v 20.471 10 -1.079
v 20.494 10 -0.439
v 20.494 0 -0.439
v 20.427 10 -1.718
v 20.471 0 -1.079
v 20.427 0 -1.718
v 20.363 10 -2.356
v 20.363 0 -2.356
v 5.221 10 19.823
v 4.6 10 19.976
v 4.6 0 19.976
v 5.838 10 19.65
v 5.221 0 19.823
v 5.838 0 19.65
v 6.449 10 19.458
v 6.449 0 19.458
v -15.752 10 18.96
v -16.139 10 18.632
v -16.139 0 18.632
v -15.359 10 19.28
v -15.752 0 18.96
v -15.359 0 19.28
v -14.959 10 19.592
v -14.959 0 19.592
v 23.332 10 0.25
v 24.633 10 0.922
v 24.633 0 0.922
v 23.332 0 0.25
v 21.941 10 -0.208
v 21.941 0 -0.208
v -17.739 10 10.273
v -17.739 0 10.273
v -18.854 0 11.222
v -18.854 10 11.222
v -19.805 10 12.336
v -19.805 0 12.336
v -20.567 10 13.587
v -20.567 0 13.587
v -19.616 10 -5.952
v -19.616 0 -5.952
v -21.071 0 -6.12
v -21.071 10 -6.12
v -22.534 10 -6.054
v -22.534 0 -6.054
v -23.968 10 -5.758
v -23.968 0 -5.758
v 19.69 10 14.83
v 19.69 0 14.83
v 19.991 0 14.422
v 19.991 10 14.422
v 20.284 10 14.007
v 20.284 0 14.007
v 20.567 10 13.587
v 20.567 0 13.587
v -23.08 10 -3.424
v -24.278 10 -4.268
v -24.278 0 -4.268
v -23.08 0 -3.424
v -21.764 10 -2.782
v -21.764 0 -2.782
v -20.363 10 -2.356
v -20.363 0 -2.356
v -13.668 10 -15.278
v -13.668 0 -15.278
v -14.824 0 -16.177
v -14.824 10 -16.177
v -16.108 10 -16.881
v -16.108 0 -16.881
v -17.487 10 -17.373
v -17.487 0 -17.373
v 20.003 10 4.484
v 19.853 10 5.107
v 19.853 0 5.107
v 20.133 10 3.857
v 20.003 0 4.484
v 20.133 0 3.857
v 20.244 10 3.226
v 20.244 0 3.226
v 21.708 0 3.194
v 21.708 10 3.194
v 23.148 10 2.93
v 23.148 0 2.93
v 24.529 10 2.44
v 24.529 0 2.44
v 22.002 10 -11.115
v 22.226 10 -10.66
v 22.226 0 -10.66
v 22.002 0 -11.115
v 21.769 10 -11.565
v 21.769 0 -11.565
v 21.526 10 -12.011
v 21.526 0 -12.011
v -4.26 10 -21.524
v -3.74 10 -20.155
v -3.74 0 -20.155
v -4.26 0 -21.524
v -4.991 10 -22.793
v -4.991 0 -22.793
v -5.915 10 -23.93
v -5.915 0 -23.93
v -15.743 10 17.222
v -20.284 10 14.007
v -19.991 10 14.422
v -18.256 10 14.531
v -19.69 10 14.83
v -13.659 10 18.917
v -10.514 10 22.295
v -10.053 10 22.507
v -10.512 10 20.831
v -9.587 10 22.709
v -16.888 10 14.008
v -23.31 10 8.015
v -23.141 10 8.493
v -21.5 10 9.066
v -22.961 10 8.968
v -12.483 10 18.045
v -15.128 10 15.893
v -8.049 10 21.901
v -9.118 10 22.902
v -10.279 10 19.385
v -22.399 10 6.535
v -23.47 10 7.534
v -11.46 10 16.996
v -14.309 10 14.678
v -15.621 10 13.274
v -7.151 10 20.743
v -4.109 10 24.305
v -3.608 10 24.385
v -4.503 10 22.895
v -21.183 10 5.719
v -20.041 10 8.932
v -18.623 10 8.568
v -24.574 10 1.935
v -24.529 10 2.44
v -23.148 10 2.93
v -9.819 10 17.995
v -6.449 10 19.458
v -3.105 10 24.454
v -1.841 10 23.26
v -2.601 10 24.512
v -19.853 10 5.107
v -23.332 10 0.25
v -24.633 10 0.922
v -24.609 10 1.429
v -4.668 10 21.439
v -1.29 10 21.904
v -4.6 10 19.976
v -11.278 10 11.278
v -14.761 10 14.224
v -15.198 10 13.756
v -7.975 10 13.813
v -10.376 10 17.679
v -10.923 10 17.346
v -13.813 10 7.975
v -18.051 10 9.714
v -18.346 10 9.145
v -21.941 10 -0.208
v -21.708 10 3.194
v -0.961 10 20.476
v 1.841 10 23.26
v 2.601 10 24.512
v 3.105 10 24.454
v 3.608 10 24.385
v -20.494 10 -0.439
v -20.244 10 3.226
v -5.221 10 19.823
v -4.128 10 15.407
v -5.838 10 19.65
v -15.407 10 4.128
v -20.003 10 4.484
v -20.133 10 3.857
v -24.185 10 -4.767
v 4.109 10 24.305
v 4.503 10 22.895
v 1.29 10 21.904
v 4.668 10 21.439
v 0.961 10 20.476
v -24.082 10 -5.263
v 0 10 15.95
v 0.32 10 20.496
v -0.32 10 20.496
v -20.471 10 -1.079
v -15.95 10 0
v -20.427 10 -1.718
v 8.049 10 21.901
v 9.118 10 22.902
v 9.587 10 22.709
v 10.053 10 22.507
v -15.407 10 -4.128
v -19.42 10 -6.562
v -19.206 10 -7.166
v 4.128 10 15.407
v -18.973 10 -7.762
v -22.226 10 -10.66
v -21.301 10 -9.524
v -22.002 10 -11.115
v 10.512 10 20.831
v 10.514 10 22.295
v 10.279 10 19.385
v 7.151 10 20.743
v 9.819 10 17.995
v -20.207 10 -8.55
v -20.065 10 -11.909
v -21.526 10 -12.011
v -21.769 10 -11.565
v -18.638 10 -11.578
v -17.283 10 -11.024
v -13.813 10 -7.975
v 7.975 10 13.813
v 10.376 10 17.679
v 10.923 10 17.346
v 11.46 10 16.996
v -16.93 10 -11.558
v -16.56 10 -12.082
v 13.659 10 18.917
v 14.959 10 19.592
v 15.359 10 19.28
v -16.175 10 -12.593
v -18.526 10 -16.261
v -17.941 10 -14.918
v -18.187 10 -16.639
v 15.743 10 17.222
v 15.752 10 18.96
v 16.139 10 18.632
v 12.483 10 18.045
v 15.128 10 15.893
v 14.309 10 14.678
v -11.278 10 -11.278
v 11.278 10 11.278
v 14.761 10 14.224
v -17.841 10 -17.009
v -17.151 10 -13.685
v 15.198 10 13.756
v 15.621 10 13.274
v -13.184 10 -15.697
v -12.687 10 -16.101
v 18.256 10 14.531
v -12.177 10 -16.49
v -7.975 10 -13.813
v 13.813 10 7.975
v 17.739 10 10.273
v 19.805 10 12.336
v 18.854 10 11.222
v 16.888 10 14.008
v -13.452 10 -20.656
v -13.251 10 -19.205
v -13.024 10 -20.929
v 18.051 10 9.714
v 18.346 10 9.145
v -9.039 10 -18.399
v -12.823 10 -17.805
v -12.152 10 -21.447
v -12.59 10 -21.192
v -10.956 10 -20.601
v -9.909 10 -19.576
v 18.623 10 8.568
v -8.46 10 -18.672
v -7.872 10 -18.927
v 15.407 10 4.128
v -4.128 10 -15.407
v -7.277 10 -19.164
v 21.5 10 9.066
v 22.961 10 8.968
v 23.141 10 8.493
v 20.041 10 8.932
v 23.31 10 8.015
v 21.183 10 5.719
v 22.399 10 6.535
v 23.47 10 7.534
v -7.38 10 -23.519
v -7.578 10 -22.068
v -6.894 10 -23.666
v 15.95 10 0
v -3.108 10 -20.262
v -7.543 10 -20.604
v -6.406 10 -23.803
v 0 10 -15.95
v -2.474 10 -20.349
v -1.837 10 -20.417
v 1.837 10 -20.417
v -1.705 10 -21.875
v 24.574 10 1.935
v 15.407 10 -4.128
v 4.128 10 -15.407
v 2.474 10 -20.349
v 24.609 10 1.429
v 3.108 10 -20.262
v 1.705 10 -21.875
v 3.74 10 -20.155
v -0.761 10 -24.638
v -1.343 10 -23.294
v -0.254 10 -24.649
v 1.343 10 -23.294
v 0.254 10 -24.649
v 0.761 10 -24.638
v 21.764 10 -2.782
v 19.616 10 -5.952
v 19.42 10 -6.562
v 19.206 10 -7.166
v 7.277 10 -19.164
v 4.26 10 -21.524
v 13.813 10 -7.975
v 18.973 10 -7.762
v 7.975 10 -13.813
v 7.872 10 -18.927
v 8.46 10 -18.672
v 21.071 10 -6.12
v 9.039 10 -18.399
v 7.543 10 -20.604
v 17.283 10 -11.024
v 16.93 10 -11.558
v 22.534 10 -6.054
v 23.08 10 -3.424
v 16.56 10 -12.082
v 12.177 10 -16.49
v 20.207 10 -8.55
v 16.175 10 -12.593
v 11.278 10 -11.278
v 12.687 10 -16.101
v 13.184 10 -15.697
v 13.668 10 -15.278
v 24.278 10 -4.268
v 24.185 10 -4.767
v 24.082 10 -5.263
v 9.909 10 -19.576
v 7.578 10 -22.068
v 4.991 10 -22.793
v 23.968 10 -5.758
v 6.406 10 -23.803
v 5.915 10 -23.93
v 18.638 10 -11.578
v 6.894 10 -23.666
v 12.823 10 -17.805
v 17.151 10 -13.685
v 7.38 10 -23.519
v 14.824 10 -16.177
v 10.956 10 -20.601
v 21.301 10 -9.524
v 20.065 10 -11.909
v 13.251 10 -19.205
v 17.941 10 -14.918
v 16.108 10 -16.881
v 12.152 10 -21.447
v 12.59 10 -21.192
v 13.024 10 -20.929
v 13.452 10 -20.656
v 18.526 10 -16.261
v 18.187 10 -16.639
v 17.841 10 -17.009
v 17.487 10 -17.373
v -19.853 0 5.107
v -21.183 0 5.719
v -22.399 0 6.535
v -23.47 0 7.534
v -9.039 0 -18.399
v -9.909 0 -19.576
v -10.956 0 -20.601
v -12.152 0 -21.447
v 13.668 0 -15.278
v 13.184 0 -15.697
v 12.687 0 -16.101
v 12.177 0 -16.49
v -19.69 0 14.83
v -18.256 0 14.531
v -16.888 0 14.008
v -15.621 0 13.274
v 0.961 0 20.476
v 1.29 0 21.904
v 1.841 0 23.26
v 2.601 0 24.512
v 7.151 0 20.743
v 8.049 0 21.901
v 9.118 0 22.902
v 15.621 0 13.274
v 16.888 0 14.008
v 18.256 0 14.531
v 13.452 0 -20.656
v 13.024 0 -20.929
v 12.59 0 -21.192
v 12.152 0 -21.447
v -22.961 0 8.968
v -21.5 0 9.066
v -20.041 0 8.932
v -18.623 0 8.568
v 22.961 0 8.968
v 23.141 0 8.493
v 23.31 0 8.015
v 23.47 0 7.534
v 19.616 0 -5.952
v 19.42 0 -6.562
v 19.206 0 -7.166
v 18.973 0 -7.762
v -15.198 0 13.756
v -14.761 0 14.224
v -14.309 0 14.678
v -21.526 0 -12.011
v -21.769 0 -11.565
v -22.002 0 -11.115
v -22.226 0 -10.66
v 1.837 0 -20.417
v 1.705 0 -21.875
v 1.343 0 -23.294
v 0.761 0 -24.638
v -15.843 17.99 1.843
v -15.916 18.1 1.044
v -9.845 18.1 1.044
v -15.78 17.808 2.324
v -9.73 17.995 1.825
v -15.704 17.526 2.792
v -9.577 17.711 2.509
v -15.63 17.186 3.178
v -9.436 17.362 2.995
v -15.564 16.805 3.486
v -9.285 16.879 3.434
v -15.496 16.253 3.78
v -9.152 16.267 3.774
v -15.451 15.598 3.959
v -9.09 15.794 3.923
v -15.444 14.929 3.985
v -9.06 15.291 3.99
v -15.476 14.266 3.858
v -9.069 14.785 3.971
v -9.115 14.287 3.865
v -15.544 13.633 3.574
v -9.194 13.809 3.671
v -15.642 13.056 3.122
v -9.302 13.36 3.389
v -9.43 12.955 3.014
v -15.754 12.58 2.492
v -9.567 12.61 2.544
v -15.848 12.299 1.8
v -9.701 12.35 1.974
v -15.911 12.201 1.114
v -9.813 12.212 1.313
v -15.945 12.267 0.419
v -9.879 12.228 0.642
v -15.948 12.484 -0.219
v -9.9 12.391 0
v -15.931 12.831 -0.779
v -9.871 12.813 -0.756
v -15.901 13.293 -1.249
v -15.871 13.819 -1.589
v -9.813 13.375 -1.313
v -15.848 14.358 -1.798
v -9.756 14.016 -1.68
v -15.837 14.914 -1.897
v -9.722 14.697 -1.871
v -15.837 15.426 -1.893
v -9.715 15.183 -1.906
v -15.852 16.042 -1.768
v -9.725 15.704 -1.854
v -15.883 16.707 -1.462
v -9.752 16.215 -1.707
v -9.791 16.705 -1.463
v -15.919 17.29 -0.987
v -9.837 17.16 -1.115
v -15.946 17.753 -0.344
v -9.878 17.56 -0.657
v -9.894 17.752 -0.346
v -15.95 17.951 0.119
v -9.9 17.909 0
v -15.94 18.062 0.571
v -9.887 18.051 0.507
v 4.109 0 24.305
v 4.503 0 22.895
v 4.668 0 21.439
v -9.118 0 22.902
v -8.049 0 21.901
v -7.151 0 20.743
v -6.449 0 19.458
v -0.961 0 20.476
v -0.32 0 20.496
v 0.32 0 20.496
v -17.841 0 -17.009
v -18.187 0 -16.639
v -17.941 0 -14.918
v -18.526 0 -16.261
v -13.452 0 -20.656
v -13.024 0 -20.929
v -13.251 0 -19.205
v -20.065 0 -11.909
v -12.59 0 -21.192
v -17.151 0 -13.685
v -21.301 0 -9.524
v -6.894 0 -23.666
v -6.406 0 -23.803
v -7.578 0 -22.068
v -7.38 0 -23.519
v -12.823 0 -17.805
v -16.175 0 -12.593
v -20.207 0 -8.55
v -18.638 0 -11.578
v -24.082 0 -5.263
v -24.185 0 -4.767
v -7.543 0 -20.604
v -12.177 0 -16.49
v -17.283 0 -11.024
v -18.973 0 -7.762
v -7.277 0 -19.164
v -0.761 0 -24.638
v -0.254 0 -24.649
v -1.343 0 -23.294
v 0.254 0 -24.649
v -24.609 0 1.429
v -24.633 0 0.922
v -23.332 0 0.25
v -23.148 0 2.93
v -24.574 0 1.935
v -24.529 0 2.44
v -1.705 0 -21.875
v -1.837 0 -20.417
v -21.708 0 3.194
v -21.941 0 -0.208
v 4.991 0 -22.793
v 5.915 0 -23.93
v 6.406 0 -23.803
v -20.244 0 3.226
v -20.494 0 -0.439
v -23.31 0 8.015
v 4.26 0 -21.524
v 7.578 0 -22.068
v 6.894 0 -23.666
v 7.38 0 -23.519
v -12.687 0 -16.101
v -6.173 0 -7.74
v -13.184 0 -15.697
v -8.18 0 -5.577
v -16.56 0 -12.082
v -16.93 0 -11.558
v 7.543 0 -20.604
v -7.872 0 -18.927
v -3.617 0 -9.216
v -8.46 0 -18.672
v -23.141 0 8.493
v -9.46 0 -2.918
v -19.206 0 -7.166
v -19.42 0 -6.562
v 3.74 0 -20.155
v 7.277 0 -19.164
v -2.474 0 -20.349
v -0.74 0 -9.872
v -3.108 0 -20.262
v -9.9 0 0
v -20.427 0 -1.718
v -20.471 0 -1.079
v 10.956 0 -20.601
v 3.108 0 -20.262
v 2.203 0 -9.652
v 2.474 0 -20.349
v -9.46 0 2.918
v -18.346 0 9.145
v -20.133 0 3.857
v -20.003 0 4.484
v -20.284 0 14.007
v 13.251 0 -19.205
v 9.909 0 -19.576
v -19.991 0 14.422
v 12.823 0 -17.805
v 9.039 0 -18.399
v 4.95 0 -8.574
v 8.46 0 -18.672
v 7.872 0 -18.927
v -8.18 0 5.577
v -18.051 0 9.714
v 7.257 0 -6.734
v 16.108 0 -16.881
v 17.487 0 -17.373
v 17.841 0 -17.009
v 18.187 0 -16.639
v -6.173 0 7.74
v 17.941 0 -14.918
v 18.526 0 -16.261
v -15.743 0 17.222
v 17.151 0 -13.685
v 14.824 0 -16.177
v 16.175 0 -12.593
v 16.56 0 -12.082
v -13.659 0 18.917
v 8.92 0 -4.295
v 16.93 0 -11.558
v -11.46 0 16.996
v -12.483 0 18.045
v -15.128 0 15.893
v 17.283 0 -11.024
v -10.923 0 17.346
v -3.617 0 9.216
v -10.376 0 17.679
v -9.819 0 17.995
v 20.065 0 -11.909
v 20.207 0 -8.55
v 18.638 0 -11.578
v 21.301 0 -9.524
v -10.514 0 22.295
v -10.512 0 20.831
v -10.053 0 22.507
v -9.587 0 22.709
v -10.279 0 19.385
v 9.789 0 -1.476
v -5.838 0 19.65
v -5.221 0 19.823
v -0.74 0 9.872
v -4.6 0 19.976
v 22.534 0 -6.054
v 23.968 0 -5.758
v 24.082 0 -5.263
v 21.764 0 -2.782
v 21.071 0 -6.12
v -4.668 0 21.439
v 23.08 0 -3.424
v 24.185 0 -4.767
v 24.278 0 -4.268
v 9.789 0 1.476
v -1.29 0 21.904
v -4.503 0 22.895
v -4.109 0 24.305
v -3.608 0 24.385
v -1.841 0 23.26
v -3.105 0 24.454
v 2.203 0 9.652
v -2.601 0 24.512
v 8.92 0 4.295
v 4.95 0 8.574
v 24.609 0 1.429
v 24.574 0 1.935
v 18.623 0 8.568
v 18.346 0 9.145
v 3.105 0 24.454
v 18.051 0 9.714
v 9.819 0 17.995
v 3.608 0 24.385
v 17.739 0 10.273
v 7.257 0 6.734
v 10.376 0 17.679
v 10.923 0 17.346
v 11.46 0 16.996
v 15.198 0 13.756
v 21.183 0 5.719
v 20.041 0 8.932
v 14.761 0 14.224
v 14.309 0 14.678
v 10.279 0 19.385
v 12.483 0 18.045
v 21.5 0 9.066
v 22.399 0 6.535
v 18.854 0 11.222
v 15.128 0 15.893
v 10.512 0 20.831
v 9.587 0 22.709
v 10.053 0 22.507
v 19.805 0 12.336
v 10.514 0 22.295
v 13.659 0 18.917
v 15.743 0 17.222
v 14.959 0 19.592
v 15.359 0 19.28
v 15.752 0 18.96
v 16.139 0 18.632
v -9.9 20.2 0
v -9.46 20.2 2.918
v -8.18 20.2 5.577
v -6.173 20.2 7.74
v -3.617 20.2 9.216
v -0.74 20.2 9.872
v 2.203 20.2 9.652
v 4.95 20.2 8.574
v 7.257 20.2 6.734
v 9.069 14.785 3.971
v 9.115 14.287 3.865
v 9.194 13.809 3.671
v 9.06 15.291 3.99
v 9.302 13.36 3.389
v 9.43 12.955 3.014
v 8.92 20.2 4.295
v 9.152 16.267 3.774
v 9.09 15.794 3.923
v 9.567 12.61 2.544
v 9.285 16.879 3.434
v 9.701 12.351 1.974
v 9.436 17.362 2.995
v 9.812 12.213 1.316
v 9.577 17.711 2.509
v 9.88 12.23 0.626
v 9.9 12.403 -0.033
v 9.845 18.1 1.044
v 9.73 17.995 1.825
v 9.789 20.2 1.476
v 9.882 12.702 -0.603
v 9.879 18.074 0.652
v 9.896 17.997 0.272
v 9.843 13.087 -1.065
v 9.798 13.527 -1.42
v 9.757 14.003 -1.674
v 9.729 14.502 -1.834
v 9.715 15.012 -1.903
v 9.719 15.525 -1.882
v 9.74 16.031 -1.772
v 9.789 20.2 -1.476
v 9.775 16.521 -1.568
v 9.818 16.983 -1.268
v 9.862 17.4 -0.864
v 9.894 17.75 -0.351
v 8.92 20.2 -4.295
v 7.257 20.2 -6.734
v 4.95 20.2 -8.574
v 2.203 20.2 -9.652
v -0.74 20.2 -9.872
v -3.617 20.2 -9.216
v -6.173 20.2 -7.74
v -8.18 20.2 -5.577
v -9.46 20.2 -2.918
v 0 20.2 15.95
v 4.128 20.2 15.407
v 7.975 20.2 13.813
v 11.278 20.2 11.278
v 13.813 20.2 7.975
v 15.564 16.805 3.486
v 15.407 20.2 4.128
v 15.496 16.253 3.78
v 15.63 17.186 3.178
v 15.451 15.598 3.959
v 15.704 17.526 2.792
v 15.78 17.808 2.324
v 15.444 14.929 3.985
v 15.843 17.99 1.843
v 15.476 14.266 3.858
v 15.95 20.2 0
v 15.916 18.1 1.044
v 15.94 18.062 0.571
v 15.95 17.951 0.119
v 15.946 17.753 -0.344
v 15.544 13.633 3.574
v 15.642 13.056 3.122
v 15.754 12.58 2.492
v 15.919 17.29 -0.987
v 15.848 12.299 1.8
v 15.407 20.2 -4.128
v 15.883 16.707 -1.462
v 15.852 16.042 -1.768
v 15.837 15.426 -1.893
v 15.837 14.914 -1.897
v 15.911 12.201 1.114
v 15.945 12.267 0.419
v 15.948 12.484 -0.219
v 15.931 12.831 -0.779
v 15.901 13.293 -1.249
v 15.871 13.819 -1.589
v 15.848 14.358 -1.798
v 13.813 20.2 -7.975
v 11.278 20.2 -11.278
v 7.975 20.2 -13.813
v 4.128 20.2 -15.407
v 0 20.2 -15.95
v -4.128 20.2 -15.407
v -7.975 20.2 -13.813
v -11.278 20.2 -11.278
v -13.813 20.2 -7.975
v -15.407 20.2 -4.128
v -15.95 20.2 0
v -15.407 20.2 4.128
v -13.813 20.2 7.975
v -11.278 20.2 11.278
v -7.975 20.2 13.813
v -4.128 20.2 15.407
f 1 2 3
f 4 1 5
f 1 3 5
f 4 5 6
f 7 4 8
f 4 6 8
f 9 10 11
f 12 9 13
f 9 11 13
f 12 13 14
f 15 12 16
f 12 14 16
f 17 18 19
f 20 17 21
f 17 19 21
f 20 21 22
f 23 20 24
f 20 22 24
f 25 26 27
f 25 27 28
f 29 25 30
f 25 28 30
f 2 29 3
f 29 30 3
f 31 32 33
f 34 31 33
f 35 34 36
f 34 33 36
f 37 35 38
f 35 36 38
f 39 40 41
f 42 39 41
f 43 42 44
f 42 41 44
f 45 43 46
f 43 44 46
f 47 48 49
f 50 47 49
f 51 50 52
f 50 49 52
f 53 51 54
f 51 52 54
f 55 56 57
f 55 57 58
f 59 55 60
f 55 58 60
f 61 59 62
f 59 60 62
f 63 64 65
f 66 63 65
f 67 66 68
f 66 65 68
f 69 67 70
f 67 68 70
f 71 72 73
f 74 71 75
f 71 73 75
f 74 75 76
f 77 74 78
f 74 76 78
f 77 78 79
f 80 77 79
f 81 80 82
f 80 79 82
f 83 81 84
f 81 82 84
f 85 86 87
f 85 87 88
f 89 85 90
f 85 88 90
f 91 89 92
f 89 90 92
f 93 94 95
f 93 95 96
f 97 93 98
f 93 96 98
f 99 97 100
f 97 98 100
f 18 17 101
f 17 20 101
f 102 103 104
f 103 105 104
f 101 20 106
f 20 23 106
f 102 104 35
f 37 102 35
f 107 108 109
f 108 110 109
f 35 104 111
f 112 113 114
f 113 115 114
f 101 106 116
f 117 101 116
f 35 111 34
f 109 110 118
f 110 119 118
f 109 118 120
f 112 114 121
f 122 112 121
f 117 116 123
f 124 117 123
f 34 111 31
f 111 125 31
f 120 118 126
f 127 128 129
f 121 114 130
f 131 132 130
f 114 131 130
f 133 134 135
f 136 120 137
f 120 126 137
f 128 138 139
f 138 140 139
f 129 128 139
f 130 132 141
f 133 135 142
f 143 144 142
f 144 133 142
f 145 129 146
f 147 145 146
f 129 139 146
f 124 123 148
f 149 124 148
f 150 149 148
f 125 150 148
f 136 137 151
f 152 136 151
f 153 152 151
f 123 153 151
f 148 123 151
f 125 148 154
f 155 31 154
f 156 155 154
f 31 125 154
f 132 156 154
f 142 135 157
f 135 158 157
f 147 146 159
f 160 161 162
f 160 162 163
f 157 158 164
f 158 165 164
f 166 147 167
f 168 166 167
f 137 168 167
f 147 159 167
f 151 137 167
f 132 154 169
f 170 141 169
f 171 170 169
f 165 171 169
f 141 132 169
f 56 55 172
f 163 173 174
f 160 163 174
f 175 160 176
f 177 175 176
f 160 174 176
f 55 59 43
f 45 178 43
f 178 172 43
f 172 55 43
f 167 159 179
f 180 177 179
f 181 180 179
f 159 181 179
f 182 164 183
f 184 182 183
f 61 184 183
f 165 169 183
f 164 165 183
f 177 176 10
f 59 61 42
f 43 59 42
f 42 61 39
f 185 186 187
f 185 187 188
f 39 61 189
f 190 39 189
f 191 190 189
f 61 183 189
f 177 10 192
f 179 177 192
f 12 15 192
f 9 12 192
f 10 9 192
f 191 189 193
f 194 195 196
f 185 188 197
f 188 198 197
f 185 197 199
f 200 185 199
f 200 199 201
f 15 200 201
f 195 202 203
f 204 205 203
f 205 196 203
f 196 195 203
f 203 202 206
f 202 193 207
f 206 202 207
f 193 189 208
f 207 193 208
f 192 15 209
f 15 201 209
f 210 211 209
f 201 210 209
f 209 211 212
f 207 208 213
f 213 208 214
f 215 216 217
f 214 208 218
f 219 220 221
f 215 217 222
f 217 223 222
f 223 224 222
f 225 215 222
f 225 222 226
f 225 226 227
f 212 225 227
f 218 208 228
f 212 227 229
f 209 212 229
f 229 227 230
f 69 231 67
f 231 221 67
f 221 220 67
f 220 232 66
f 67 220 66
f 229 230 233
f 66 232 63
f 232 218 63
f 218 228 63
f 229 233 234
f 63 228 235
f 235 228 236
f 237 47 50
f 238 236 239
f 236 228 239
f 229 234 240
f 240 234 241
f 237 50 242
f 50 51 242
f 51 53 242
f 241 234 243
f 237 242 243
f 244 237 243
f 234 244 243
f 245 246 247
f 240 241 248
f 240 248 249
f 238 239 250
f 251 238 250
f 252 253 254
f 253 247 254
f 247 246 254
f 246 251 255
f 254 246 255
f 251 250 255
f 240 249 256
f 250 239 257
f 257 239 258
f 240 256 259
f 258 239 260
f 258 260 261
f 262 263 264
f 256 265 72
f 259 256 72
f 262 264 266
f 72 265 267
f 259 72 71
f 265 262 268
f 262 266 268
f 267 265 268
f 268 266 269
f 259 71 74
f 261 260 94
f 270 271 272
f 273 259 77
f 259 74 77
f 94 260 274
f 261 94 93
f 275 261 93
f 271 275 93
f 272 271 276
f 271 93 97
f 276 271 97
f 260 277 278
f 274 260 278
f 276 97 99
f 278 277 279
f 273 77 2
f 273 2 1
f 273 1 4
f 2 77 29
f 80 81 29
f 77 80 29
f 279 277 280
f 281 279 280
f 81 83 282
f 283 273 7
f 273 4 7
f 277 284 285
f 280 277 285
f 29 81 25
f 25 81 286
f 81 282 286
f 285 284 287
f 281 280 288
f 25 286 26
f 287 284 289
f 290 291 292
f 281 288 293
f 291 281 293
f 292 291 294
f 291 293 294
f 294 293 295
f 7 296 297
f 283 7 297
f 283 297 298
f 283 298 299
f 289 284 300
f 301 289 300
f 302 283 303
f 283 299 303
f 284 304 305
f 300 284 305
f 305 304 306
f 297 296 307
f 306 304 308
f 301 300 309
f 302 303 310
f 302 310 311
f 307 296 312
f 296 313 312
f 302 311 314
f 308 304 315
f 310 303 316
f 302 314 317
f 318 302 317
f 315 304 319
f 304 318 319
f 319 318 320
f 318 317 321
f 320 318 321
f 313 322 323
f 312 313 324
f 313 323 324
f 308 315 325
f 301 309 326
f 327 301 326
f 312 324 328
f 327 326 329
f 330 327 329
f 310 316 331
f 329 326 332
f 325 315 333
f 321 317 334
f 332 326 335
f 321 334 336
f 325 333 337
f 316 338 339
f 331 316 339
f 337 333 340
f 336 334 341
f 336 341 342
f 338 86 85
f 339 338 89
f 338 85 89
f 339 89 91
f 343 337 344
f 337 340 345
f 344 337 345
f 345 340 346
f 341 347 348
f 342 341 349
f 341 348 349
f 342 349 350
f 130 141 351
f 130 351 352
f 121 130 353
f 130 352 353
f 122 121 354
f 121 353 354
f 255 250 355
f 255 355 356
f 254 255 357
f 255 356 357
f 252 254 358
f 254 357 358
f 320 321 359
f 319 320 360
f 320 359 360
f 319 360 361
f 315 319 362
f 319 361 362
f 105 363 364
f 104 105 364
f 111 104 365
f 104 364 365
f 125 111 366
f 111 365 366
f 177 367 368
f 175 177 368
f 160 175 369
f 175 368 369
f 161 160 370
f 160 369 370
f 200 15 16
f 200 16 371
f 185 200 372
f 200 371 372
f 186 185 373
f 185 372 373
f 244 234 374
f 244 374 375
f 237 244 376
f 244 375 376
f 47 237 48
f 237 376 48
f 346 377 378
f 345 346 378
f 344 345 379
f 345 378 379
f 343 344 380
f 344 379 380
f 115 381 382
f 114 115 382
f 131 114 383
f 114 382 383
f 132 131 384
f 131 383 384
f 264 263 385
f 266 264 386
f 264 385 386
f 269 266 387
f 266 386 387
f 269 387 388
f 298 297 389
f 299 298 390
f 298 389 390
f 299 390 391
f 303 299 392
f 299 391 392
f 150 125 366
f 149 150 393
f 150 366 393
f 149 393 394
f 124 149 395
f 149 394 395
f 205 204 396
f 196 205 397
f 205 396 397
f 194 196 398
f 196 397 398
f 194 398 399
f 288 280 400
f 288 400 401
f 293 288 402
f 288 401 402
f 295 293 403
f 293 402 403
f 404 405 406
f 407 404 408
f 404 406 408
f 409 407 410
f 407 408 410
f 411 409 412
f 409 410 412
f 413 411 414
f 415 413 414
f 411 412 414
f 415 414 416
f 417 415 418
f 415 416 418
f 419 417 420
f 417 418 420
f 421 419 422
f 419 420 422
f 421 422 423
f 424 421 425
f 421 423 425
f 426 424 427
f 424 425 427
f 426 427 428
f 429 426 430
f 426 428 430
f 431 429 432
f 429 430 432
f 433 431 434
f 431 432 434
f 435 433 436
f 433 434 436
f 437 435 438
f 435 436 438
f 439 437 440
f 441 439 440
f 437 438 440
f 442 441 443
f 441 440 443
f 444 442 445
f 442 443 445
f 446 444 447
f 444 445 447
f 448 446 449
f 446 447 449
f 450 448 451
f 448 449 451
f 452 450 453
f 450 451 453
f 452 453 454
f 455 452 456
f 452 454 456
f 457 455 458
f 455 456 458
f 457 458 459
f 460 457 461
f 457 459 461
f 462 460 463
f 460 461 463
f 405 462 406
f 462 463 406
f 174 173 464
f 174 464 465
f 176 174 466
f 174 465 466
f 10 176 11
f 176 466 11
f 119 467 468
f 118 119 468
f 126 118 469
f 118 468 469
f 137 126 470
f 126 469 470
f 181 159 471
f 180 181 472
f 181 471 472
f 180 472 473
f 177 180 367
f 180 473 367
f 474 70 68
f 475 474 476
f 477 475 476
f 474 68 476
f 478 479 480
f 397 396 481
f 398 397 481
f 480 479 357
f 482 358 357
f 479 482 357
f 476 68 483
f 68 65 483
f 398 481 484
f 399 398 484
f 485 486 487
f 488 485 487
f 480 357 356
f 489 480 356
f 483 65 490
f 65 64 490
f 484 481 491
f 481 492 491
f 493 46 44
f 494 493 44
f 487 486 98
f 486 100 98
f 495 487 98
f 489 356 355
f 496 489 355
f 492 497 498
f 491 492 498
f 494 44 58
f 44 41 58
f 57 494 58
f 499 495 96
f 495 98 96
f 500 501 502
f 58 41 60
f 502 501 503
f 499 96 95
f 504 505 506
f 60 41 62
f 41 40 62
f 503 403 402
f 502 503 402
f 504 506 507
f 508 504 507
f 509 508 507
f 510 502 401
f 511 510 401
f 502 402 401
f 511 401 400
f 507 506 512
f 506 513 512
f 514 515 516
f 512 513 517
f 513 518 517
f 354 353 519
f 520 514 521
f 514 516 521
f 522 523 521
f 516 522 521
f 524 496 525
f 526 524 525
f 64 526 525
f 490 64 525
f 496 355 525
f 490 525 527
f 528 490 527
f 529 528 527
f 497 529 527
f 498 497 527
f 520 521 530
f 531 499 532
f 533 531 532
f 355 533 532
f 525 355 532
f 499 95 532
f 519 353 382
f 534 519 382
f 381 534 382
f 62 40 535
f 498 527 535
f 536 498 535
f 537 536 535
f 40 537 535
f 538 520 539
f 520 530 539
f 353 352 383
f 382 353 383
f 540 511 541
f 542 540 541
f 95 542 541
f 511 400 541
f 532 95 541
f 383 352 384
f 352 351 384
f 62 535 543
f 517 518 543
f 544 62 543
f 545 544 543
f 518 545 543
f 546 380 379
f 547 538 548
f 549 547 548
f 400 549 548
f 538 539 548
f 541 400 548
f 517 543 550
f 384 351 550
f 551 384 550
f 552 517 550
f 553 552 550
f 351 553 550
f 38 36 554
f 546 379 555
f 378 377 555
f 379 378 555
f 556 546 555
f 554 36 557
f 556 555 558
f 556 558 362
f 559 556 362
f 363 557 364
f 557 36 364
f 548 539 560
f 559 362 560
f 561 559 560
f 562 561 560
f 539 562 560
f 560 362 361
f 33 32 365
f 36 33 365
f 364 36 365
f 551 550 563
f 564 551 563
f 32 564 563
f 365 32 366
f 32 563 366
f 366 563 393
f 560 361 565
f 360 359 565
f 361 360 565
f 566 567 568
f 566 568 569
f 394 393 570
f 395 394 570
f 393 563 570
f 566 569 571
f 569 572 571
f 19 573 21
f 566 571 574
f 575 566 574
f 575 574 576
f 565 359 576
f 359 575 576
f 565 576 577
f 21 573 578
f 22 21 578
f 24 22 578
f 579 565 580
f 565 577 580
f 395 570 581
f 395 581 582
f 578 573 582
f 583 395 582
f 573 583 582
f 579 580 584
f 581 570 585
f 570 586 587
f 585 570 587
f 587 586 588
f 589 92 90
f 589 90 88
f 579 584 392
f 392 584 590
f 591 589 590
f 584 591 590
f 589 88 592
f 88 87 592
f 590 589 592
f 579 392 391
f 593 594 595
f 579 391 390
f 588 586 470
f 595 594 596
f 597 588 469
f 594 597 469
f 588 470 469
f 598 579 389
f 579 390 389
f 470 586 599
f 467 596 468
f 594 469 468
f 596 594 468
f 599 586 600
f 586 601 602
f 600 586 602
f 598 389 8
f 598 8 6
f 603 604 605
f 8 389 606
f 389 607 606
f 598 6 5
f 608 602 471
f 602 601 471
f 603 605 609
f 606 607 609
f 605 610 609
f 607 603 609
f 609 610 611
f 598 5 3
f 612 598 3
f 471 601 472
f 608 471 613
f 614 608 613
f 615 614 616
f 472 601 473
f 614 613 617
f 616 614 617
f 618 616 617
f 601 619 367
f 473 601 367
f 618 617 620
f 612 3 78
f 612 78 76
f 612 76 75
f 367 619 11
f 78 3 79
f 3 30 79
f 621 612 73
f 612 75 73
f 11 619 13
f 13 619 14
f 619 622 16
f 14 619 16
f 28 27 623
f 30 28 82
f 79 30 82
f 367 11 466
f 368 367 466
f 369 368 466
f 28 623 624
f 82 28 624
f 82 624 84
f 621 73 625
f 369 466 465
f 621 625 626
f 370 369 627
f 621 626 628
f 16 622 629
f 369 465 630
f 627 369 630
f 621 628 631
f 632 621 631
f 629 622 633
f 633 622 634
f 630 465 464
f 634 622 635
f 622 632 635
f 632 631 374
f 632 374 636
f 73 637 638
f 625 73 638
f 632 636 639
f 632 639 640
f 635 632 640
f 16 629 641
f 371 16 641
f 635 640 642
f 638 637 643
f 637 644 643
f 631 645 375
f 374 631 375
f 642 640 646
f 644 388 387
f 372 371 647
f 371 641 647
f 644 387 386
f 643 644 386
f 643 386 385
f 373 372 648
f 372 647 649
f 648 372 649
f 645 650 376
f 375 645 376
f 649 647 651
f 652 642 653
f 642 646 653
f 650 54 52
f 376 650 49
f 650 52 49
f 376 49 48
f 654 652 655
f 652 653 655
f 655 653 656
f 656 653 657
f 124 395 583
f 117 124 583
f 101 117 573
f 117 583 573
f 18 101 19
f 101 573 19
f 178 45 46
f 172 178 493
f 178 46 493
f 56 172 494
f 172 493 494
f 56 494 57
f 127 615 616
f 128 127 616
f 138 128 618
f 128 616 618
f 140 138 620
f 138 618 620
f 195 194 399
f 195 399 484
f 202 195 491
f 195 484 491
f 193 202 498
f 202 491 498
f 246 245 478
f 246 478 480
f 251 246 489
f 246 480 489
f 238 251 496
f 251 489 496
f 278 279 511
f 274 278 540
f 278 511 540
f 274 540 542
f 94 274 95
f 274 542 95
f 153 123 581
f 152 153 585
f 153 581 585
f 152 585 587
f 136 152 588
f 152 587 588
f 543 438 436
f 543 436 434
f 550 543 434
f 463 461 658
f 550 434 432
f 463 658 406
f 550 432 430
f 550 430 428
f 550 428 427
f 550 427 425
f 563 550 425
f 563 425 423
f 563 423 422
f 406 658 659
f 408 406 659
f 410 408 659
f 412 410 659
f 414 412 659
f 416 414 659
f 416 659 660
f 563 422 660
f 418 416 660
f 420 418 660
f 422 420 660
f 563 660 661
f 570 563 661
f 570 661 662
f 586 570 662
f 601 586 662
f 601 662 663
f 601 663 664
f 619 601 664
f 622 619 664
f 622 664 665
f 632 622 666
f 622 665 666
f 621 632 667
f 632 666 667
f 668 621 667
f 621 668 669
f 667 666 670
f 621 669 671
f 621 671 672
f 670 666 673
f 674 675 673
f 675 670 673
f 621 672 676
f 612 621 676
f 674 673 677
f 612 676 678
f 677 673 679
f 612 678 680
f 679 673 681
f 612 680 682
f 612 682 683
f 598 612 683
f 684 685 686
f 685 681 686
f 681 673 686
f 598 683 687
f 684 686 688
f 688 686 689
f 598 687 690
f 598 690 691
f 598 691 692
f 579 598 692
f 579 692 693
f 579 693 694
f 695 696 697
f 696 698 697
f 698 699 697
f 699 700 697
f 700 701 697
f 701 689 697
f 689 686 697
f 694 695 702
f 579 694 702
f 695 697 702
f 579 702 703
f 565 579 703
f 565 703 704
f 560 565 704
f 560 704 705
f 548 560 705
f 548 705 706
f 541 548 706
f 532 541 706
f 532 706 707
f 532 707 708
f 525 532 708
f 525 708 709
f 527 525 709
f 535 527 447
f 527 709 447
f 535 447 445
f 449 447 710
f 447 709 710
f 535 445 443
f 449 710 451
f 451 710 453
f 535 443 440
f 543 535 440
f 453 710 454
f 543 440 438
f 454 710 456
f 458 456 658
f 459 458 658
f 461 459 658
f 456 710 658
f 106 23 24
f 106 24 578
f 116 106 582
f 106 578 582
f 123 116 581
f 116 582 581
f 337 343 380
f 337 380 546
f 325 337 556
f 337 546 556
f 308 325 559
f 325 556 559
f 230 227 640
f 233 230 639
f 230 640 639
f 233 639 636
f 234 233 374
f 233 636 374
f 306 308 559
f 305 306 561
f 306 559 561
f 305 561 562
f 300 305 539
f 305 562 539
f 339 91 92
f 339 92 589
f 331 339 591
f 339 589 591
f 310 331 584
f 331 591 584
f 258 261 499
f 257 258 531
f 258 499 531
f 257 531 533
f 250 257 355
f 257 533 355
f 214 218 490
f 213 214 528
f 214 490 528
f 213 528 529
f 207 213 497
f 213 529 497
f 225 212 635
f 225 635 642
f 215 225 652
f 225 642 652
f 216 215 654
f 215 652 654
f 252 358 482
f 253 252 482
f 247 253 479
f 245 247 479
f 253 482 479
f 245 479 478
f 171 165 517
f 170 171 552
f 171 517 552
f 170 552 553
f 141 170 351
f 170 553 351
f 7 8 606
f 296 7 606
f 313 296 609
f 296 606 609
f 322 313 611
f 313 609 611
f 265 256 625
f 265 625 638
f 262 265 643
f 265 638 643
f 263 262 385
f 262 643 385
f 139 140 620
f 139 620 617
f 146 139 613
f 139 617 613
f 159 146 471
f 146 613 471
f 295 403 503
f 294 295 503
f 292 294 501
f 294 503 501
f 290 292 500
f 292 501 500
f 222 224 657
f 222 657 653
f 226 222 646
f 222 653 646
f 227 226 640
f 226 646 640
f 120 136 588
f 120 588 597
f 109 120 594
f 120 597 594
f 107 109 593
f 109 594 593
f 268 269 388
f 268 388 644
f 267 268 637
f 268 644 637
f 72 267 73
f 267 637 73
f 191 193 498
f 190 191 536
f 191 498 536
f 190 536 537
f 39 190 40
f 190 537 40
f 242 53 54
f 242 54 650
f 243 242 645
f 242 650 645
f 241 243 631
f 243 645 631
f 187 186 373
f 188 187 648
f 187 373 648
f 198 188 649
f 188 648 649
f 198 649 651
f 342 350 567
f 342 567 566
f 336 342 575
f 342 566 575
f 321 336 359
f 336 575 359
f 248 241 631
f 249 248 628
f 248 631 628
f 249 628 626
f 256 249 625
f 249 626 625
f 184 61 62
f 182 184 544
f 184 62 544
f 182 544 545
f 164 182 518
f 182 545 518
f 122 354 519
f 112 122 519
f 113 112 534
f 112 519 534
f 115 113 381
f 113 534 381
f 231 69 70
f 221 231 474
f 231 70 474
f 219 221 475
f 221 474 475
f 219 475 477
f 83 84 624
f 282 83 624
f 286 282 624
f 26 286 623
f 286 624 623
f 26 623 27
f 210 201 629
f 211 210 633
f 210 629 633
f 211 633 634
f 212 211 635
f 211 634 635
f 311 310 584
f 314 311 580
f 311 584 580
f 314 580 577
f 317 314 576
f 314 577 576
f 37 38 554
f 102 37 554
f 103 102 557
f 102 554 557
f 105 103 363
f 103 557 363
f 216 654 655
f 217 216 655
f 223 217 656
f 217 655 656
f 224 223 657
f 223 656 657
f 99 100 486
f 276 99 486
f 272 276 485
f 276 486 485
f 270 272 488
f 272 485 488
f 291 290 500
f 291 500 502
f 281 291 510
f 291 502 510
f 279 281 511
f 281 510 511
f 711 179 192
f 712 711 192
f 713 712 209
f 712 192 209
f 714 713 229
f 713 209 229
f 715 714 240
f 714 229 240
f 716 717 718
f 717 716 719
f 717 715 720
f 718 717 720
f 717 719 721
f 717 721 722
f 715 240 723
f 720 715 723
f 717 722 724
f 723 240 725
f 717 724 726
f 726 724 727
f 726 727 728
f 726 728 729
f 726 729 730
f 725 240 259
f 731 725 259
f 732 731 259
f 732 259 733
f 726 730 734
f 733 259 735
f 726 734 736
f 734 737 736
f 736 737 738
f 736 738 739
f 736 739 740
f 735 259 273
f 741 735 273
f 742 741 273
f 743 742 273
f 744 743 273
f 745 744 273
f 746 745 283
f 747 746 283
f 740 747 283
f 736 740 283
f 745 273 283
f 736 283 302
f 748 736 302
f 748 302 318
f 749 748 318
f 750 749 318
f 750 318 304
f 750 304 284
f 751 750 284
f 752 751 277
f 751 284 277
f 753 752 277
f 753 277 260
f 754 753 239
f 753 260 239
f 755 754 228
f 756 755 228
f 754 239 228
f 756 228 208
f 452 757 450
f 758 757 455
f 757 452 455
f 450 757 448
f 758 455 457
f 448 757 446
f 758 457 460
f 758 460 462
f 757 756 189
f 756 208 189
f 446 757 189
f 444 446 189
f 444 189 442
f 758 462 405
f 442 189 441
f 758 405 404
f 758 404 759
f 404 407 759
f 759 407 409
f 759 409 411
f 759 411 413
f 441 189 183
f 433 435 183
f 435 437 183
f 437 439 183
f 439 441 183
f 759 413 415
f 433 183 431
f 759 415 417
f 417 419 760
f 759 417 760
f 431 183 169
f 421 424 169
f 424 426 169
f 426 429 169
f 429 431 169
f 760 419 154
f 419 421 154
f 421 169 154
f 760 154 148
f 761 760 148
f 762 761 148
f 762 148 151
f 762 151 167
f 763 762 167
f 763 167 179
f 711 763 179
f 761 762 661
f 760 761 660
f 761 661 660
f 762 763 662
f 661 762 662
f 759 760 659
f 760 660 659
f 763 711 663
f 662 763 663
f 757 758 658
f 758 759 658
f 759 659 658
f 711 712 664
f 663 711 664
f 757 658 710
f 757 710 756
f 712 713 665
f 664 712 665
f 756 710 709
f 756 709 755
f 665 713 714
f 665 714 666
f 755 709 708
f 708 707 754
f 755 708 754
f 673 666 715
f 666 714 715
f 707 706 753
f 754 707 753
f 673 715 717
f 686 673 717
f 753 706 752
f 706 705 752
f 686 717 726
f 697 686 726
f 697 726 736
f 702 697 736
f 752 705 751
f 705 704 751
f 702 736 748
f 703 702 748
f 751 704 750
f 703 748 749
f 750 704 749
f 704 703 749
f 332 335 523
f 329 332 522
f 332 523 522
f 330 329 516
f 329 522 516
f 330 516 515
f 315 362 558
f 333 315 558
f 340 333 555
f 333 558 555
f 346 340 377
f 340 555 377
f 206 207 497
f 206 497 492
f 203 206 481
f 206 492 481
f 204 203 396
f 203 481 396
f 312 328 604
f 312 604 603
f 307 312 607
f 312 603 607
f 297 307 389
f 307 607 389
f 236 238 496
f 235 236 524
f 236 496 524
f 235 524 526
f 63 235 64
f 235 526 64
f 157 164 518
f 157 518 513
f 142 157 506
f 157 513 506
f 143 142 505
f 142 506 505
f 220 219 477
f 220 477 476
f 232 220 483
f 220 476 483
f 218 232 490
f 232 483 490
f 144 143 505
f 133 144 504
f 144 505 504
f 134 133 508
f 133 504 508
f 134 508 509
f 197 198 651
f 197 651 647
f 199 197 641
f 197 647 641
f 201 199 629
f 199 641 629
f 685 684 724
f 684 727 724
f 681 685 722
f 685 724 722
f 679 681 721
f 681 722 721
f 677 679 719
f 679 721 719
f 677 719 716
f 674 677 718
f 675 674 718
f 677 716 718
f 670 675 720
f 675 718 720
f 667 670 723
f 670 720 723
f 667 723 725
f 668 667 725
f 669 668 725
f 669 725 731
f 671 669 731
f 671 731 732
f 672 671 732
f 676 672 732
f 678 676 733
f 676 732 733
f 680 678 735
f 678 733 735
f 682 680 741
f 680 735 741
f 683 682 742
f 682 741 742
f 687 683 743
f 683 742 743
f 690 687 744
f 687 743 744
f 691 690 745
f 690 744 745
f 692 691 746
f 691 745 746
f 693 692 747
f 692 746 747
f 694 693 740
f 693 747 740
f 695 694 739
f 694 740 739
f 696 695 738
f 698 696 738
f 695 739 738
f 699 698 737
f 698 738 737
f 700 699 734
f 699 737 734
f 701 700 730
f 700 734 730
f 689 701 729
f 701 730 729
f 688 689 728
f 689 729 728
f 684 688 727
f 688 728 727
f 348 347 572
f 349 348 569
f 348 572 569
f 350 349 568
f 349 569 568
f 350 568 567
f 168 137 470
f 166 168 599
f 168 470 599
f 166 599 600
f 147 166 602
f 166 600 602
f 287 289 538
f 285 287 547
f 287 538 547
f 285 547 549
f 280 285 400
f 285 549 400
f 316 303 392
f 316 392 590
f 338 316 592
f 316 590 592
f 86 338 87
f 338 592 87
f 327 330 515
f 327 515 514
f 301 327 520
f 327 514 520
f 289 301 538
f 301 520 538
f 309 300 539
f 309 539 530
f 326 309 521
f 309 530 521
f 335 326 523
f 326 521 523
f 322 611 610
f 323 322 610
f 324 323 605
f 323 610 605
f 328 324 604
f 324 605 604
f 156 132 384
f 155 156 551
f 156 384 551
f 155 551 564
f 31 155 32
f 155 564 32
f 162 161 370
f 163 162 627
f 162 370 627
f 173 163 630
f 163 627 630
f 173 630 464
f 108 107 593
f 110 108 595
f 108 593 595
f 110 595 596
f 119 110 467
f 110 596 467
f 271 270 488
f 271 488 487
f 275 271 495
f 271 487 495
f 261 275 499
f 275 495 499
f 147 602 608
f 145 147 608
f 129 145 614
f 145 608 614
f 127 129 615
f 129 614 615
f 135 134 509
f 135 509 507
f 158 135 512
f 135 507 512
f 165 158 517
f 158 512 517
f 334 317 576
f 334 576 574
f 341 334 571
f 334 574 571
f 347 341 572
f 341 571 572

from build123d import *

# Parameters (mm, degrees)
F2_R            = 9.9
F3_DEPTH        = 25
F5_DEPTH        = 25
F5_COPIES_COUNT = 23
F7_R            = 2.95
F8_DEPTH        = 37.3


# Not quite as in the source:
# - a feature of the source that left no trace in its solid (it failed there, or was rolled back) is left out
# - a pattern or mirror of a feature is missing from the dataset's text; its kind, count and spacing are read off the source's solid


with BuildPart() as f1:
    # F0 (on Right) → F1 (revolve)
    with BuildSketch(Plane.YZ):
        Polygon((0, 24.65), (0, 0), (20.2, 0), (20.2, 15.95), (10, 15.95), (10, 24.65), align=None)
    revolve(axis=Axis((0, 10.1, 0), (0, 1, 0)))

    # F2 (on face) → F3 (cut)
    with BuildSketch(Plane(origin=(0, 20.2, 0), x_dir=(-1, 0, 0), z_dir=(0, 1, 0))):
        Circle(F2_R)
    extrude(amount=-F3_DEPTH, mode=Mode.SUBTRACT)

    # F4 (on face) → F5 (cut)
    with BuildSketch(Plane.XZ):
        with BuildLine():
            ThreePointArc((0.9605272399, 20.4764837905), (1.5385061373, 22.5929437067), (2.6011700561, 24.5123726787))
            ThreePointArc((2.6011700561, 24.5123726787), (0, 24.65), (-2.6011700561, 24.5123726787))
            ThreePointArc((-2.6011700561, 24.5123726787), (-1.5385061373, 22.5929437067), (-0.9605272399, 20.4764837905))
            ThreePointArc((-0.9605272399, 20.4764837905), (0, 20.499), (0.9605272399, 20.4764837905))
        make_face()
        with BuildLine():
            ThreePointArc((2.6011700561, 24.5123726787), (2.8144449637, 24.7961797548), (3.0385106282, 25.0715471833))
            ThreePointArc((3.0385106282, 25.0715471833), (0, 25.255), (-3.0385106282, 25.0715471833))
            ThreePointArc((-3.0385106282, 25.0715471833), (-2.8144449637, 24.7961797548), (-2.6011700561, 24.5123726787))
            ThreePointArc((-2.6011700561, 24.5123726787), (0, 24.65), (2.6011700561, 24.5123726787))
        make_face()
    f5 = extrude(amount=-F5_DEPTH, mode=Mode.SUBTRACT)

    # F5_copies: F5 ×23 about axis
    f5_copies_axis = Axis((0, 0, 0), (0, 1, 0))
    for i in range(1, F5_COPIES_COUNT):
        add(f5.rotate(f5_copies_axis, i * 360 / F5_COPIES_COUNT), mode=Mode.SUBTRACT)

    # F7 (on Right) → F8 (cut, symmetric)
    with BuildSketch(Plane.YZ):
        with Locations((15.15, 1.0436970042)):
            Circle(F7_R)
    extrude(amount=F8_DEPTH, both=True, mode=Mode.SUBTRACT)


solid = f1.part
